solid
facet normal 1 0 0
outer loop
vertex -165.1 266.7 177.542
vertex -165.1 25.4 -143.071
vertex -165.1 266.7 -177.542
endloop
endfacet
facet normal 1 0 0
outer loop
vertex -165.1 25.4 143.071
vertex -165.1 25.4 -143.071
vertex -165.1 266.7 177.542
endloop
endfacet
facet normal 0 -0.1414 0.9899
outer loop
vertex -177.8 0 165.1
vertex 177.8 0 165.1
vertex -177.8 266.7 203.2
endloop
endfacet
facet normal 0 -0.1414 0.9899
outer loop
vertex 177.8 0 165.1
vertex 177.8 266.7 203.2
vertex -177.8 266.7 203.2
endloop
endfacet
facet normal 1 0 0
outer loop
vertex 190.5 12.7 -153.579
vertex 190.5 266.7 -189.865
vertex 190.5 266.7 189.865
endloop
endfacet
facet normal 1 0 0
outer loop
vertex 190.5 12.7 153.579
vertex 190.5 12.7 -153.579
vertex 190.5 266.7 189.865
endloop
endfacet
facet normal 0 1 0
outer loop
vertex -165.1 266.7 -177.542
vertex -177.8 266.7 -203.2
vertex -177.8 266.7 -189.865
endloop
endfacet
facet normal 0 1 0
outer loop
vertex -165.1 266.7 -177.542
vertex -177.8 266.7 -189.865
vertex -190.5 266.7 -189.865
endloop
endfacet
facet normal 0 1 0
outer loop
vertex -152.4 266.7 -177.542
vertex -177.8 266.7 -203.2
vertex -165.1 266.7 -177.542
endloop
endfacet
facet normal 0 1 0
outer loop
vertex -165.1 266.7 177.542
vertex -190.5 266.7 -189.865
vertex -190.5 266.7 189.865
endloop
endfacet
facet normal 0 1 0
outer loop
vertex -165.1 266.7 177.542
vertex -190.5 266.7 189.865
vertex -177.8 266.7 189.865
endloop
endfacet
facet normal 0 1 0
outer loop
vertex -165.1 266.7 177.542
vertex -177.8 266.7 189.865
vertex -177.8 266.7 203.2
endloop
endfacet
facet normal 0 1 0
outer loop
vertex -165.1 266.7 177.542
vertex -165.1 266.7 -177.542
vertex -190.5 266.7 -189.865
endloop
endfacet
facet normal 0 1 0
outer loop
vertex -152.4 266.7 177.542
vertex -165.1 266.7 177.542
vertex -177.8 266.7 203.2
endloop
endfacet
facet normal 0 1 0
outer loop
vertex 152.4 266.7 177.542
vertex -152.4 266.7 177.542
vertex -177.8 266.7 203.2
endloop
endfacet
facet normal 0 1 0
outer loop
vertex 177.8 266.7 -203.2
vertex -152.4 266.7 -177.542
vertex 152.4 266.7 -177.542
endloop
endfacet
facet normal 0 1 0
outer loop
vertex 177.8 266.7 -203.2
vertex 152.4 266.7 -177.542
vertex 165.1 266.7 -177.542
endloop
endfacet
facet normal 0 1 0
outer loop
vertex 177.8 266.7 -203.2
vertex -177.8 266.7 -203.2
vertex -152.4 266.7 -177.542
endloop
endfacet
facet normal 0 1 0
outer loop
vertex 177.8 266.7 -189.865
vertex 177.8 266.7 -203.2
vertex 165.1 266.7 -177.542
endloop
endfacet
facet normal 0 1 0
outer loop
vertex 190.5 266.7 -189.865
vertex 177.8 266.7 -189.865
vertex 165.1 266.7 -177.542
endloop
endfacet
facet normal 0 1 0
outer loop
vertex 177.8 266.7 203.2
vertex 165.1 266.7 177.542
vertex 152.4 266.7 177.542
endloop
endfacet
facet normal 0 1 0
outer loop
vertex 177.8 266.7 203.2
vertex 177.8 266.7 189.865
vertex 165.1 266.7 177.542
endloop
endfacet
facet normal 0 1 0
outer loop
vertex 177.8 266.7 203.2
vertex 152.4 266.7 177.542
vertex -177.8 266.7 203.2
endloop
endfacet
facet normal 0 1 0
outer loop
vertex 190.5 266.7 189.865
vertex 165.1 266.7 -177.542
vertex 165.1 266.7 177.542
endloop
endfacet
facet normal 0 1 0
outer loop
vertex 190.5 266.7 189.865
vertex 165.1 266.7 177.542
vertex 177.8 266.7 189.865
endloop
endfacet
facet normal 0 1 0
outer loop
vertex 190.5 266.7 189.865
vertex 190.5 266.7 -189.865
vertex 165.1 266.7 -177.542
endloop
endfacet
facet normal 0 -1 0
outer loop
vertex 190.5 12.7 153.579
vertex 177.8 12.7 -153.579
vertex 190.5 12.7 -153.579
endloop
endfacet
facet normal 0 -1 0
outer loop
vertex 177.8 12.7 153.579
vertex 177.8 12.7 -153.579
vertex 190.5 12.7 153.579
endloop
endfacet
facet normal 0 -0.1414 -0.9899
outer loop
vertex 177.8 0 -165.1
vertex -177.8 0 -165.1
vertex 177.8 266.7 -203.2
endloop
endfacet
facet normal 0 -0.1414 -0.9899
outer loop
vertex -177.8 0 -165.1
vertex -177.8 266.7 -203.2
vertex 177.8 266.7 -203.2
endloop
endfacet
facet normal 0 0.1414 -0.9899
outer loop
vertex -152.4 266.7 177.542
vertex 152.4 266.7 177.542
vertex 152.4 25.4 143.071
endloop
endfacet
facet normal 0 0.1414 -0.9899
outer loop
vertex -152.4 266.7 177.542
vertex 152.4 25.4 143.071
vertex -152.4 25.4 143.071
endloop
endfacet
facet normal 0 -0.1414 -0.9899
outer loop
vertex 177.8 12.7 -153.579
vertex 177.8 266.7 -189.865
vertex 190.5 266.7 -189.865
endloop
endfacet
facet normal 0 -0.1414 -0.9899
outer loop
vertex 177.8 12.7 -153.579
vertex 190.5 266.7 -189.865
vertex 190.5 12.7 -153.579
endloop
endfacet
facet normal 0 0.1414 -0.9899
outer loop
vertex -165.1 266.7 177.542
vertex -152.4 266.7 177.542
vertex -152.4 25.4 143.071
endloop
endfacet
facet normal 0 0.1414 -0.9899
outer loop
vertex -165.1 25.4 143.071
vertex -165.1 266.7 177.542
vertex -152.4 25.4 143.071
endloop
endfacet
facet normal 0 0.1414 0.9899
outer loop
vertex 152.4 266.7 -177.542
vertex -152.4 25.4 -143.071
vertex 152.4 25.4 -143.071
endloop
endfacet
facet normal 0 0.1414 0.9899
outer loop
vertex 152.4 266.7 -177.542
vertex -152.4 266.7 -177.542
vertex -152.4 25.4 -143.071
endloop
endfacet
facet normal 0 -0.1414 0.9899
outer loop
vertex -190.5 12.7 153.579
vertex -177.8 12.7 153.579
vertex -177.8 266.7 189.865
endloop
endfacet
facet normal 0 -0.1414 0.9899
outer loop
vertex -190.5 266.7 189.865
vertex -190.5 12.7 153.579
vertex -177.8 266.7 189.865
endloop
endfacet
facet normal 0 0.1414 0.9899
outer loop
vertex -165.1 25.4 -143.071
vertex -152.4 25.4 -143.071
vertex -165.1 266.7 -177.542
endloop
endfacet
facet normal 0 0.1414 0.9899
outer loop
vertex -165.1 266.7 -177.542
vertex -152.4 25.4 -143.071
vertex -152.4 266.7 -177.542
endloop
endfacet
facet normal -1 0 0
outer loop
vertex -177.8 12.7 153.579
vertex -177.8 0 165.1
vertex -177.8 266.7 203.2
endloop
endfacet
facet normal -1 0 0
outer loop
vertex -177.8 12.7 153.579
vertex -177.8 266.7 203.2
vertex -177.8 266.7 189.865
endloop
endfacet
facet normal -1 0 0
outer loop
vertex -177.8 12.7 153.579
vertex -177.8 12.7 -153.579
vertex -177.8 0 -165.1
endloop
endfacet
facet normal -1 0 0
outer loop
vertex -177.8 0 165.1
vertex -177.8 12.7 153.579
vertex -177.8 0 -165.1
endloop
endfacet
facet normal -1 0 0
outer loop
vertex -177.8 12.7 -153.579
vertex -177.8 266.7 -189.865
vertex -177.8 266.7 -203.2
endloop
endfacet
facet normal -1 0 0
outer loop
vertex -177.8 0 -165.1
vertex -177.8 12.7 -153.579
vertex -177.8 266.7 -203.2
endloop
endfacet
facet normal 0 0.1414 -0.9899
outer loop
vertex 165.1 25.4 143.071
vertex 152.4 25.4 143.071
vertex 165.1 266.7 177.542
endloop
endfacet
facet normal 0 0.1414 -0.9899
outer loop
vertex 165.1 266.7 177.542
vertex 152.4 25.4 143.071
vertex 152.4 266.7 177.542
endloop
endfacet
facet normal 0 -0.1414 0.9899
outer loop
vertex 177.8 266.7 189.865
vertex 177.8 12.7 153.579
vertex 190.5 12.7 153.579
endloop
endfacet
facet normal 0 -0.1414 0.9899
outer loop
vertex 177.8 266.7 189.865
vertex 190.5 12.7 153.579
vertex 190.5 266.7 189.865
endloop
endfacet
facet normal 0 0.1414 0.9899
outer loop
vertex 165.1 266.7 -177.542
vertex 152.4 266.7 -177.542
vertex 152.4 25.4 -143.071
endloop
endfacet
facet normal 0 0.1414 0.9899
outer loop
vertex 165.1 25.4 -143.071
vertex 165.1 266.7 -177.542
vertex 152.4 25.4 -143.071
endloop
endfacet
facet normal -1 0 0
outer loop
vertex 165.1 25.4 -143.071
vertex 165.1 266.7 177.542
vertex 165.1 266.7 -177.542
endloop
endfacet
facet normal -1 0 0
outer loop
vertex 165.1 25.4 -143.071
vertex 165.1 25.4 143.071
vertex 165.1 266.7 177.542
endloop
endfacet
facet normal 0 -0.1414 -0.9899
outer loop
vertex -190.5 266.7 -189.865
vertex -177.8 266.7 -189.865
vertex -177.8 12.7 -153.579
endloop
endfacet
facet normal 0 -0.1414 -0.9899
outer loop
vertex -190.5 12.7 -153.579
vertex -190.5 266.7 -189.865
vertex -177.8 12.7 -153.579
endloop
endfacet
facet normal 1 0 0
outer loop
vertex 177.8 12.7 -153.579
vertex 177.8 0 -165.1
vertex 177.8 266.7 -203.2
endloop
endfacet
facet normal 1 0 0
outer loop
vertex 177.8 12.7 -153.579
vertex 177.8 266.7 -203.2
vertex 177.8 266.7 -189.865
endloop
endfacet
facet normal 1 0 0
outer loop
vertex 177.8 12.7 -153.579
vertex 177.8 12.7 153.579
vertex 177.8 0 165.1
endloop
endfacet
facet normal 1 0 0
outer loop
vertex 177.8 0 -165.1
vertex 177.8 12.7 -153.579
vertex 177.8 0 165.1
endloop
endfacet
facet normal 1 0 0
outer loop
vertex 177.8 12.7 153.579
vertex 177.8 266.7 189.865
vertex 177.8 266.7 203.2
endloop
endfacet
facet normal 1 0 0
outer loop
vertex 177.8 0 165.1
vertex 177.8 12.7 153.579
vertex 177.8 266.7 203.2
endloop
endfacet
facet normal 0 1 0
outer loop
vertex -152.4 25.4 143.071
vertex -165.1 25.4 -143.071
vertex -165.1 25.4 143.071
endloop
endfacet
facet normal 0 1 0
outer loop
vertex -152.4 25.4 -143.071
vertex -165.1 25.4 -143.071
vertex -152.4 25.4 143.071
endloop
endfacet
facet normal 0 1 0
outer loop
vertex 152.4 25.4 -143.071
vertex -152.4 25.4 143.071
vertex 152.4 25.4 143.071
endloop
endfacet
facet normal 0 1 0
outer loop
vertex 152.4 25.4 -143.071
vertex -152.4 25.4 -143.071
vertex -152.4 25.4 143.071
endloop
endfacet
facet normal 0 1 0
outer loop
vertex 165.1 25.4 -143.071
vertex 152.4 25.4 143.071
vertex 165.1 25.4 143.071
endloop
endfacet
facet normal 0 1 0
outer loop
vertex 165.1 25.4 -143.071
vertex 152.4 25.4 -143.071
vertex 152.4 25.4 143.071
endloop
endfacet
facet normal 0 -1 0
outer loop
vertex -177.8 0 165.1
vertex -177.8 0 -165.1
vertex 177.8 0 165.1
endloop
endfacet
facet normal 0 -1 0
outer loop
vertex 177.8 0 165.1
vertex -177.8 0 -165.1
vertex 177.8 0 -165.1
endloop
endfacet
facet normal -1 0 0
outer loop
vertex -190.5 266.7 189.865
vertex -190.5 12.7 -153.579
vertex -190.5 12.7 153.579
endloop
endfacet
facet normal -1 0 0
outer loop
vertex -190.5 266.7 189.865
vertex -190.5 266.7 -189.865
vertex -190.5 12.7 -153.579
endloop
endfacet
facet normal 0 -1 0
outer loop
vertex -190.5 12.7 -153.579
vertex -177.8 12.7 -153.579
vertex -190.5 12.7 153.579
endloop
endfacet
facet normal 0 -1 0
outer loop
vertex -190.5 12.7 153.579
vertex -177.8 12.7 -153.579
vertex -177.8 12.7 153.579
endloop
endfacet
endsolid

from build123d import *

# Parameters (mm, degrees)
SHELL1_T                 = -25.4
SHELL1_THICKNESS_2_DEPTH = 12.7
SHELL1_THICKNESS_3_DEPTH = 12.7
BOSS_EXTRUDE2_START      = -12.7
BOSS_EXTRUDE2_DEPTH      = 25.4
BOSS_EXTRUDE3_DEPTH      = 12.7


with BuildPart() as part:
    # Sketch1 → Loft1 section 0
    with BuildSketch(Plane(origin=(0, 0, 0), x_dir=(1, 0, 0), z_dir=(0, 1, 0))):
        with BuildLine():
            Line((-177.8, 165.1), (177.8, 165.1))
            Line((177.8, 165.1), (177.8, -165.1))
            Line((177.8, -165.1), (-177.8, -165.1))
            Line((-177.8, -165.1), (-177.8, 165.1))
        make_face()
    # Sketch2 → Loft1 section 1
    with BuildSketch(Plane(origin=(0, 266.7, 0), x_dir=(1, 0, 0), z_dir=(0, 1, 0))):
        with BuildLine():
            Line((-177.8, 203.2), (177.8, 203.2))
            Line((177.8, 203.2), (177.8, -203.2))
            Line((177.8, -203.2), (-177.8, -203.2))
            Line((-177.8, -203.2), (-177.8, 203.2))
        make_face()
    loft()

    # Shell1
    shell1_openings = [part.faces().sort_by_distance(p)[0] for p in [
        (0, 266.7, 0),
    ]]
    offset(amount=SHELL1_T, openings=shell1_openings, kind=Kind.INTERSECTION)

    # Shell1 thickness 2 face (on inner face of the shell) → Shell1 thickness 2 (cut)
    with BuildSketch(Plane(origin=(-152.4, 150.373987865, 0), x_dir=(0, 0, -1), z_dir=(-1, 0, 0))):
        Polygon((-143.070696797, 124.973987865), (143.070696797, 124.973987865), (177.542125368, -116.326012135), (-177.542125368, -116.326012135), align=None)
    extrude(amount=SHELL1_THICKNESS_2_DEPTH, mode=Mode.SUBTRACT)

    # Shell1 thickness 3 face (on inner face of the shell) → Shell1 thickness 3 (cut)
    with BuildSketch(Plane(origin=(152.4, 150.373987865, 0), x_dir=(0, 0, 1), z_dir=(1, 0, 0))):
        Polygon((177.542125368, -116.326012135), (-177.542125368, -116.326012135), (-143.070696797, 124.973987865), (143.070696797, 124.973987865), align=None)
    extrude(amount=SHELL1_THICKNESS_3_DEPTH, mode=Mode.SUBTRACT)

    # Sketch4 → Boss-Extrude2 (add)
    with BuildSketch(Plane(origin=(177.8, 0, 0), x_dir=(0, 0, -1), z_dir=(1, 0, 0)).offset(BOSS_EXTRUDE2_START)):
        Polygon((189.865, 266.7), (153.579285714, 12.7), (-153.579285714, 12.7), (-189.865, 266.7), align=None)
    extrude(amount=BOSS_EXTRUDE2_DEPTH)

    # Sketch5 → Boss-Extrude3 (add)
    with BuildSketch(Plane.ZY.offset(177.8)):
        Polygon((-153.579285714, 12.7), (153.579285714, 12.7), (189.865, 266.7), (-189.865, 266.7), align=None)
    extrude(amount=BOSS_EXTRUDE3_DEPTH)


solid = part.part
